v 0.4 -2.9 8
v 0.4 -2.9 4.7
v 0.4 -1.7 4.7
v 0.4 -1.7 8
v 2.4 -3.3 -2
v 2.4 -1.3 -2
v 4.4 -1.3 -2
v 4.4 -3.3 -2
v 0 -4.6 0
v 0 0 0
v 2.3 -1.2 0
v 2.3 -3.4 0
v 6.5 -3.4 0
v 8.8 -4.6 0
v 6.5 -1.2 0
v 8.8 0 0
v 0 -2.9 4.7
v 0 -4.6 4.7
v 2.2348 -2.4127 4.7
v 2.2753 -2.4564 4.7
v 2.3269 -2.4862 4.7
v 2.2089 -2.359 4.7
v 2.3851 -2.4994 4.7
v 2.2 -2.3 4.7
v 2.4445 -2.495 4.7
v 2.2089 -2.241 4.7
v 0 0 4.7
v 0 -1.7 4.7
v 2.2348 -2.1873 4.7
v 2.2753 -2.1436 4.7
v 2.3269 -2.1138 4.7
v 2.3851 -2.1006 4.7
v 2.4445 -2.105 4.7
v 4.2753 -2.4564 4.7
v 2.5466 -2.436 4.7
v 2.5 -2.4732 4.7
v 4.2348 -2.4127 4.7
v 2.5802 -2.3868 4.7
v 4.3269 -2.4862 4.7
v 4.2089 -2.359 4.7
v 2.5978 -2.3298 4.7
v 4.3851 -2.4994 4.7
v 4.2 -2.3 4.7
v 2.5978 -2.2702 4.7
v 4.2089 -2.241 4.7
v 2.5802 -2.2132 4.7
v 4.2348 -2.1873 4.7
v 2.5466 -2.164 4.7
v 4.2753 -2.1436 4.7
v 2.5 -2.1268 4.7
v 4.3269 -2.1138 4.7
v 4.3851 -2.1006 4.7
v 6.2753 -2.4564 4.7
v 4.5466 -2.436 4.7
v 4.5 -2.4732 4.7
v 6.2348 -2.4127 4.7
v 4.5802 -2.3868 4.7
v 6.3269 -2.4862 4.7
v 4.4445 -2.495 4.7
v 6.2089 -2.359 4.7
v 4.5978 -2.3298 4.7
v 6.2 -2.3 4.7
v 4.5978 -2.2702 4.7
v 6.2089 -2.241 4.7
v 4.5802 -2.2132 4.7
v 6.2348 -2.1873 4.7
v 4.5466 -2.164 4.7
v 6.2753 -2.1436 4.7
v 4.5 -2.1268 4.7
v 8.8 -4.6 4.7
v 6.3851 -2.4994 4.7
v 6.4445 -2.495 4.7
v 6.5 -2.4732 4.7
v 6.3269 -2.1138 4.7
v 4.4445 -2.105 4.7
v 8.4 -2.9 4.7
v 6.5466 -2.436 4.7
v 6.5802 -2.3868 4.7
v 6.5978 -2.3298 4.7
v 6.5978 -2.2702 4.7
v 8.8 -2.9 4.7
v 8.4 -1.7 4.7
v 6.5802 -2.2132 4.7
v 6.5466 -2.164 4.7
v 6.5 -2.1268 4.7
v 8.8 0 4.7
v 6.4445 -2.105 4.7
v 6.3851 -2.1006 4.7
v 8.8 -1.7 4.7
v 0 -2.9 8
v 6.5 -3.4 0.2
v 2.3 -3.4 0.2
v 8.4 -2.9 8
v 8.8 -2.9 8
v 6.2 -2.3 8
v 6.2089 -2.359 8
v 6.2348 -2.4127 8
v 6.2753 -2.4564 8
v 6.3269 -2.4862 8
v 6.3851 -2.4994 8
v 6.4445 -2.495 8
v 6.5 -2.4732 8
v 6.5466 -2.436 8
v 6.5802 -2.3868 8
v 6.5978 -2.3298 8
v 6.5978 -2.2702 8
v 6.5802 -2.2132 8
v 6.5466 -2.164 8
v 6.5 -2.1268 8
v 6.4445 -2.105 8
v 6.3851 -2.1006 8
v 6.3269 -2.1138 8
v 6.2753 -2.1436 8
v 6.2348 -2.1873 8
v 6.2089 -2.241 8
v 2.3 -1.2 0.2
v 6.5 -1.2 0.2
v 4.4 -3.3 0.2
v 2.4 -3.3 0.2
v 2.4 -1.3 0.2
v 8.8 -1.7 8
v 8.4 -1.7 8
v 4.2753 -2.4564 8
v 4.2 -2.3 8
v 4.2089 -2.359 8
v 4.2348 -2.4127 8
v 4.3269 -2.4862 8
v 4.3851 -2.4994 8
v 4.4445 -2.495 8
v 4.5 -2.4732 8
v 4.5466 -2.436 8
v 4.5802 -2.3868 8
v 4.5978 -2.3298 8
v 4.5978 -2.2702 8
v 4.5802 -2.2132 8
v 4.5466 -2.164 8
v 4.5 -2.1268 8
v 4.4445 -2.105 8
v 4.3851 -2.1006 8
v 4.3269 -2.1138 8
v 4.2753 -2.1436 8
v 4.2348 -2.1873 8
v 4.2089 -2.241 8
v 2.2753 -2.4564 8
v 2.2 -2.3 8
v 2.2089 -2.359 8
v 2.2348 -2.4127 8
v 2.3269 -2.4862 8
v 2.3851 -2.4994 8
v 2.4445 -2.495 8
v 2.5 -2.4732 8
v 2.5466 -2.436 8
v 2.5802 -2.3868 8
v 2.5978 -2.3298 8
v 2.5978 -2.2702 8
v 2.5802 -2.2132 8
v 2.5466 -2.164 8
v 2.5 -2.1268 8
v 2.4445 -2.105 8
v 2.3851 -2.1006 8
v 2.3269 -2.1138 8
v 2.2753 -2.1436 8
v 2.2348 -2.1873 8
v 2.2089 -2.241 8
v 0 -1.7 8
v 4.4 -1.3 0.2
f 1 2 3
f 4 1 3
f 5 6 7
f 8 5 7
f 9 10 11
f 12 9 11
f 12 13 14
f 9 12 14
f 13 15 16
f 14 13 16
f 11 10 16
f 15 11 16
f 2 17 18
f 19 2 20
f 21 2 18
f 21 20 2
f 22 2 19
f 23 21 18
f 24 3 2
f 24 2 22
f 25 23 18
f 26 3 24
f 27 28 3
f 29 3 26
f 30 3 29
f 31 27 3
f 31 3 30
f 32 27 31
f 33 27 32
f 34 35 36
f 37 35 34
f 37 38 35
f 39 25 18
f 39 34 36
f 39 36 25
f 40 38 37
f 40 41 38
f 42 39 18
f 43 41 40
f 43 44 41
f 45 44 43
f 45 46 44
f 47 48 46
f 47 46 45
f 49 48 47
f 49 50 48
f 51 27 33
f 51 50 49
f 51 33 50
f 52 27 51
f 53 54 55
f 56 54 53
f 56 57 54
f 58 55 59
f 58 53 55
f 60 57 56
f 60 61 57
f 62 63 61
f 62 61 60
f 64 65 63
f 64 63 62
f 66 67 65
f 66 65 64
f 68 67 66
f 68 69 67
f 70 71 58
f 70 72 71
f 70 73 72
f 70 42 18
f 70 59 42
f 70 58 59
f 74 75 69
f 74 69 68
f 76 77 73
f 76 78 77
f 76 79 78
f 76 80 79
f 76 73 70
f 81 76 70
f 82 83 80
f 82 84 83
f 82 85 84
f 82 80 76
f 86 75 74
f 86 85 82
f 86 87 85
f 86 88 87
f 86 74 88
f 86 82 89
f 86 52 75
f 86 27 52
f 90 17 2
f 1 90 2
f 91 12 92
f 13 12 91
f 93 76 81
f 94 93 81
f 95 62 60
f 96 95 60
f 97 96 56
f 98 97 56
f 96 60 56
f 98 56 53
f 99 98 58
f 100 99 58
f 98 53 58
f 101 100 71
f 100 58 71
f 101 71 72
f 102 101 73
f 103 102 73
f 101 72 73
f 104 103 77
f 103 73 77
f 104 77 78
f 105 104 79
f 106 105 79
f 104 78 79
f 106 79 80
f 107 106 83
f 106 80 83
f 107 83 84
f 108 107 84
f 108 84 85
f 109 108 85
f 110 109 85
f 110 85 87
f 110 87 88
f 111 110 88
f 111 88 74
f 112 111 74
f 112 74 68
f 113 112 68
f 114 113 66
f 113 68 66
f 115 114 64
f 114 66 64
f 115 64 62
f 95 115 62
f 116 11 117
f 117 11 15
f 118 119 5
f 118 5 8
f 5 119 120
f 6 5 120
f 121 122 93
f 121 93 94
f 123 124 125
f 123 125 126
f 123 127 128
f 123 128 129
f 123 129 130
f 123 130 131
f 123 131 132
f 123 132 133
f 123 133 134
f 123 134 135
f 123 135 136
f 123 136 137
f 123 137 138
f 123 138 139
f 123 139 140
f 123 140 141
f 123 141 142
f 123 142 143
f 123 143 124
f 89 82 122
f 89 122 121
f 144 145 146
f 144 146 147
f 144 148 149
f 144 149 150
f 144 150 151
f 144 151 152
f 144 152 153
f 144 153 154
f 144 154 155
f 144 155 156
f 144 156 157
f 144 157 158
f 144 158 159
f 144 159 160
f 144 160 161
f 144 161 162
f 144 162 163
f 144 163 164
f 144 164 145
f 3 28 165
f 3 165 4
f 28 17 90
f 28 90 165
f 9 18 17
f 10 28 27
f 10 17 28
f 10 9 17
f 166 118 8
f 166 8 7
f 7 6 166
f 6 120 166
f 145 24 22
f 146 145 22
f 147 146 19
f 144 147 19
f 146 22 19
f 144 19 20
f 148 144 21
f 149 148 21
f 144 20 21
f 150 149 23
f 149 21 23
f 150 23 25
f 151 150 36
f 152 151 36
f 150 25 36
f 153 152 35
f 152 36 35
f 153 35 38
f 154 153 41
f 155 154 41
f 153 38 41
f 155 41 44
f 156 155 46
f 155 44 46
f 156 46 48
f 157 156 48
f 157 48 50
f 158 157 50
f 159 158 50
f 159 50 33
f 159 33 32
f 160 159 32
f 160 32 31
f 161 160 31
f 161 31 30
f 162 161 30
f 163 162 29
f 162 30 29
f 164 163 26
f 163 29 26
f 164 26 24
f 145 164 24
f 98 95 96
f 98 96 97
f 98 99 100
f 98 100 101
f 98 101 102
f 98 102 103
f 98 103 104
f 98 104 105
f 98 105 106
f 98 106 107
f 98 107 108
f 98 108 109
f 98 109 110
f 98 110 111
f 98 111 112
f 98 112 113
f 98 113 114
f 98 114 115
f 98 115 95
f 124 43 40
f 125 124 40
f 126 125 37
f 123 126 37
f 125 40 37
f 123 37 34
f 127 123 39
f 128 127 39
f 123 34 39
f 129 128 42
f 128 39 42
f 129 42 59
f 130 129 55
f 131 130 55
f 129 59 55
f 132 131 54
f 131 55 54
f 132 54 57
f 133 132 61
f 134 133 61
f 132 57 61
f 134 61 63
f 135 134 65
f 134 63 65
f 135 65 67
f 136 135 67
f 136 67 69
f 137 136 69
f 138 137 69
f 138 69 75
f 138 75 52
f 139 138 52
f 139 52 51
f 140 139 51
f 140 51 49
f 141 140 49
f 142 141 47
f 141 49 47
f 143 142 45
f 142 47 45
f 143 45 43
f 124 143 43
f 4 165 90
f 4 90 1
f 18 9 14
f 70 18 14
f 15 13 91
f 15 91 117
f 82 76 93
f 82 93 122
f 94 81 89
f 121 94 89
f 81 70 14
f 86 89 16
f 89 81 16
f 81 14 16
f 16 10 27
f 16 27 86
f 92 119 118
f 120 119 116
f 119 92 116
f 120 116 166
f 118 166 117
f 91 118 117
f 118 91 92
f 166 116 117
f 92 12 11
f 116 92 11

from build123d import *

# Parameters (mm, degrees)
SKETCH_1_W          = 8.8
SKETCH_1_H          = 4.6
EXTRUDE_1_DEPTH     = 4.7
SKETCH_1_3_W        = 4.2
SKETCH_1_3_H        = 2.2
SKETCH_1_3_W_2      = 2
SKETCH_1_3_H_2      = 2
CUT_EXTRUDE_1_DEPTH = 0.2
SKETCH_1_4_W        = 2
SKETCH_1_4_H        = 2
EXTRUDE_2_DEPTH     = 2
SKETCH_2_R          = 0.2
SKETCH_2_W          = 0.4
SKETCH_2_H          = 1.2
EXTRUDE_3_DEPTH     = 3.3


with BuildPart() as part:
    # 草图1 → 凸台-拉伸1 (new body)
    with BuildSketch(Plane.XY):
        with Locations((4.4, -2.3)):
            Rectangle(SKETCH_1_W, SKETCH_1_H)
    extrude(amount=EXTRUDE_1_DEPTH)

    # 草图1<3> → 切除-拉伸1 (cut)
    with BuildSketch(Plane.XY):
        with Locations((4.4, -2.3)):
            Rectangle(SKETCH_1_3_W, SKETCH_1_3_H)
        with Locations((3.4, -2.3)):
            Rectangle(SKETCH_1_3_W_2, SKETCH_1_3_H_2, mode=Mode.SUBTRACT)
    extrude(amount=CUT_EXTRUDE_1_DEPTH, mode=Mode.SUBTRACT)

    # 草图1<4> → 凸台-拉伸2 (add)
    with BuildSketch(Plane.XY):
        with Locations((3.4, -2.3)):
            Rectangle(SKETCH_1_4_W, SKETCH_1_4_H)
    extrude(amount=-EXTRUDE_2_DEPTH)

    # 草图2 → 凸台-拉伸3 (add)
    with BuildSketch(Plane.XY.offset(4.7)):
        with Locations((2.4, -2.3)):
            Circle(SKETCH_2_R)
        with Locations((4.4, -2.3)):
            Circle(SKETCH_2_R)
        with Locations((6.4, -2.3)):
            Circle(SKETCH_2_R)
        with Locations((8.6, -2.3)):
            Rectangle(SKETCH_2_W, SKETCH_2_H)
        with Locations((0.2, -2.3)):
            Rectangle(SKETCH_2_W, SKETCH_2_H)
    extrude(amount=EXTRUDE_3_DEPTH)


solid = part.part
